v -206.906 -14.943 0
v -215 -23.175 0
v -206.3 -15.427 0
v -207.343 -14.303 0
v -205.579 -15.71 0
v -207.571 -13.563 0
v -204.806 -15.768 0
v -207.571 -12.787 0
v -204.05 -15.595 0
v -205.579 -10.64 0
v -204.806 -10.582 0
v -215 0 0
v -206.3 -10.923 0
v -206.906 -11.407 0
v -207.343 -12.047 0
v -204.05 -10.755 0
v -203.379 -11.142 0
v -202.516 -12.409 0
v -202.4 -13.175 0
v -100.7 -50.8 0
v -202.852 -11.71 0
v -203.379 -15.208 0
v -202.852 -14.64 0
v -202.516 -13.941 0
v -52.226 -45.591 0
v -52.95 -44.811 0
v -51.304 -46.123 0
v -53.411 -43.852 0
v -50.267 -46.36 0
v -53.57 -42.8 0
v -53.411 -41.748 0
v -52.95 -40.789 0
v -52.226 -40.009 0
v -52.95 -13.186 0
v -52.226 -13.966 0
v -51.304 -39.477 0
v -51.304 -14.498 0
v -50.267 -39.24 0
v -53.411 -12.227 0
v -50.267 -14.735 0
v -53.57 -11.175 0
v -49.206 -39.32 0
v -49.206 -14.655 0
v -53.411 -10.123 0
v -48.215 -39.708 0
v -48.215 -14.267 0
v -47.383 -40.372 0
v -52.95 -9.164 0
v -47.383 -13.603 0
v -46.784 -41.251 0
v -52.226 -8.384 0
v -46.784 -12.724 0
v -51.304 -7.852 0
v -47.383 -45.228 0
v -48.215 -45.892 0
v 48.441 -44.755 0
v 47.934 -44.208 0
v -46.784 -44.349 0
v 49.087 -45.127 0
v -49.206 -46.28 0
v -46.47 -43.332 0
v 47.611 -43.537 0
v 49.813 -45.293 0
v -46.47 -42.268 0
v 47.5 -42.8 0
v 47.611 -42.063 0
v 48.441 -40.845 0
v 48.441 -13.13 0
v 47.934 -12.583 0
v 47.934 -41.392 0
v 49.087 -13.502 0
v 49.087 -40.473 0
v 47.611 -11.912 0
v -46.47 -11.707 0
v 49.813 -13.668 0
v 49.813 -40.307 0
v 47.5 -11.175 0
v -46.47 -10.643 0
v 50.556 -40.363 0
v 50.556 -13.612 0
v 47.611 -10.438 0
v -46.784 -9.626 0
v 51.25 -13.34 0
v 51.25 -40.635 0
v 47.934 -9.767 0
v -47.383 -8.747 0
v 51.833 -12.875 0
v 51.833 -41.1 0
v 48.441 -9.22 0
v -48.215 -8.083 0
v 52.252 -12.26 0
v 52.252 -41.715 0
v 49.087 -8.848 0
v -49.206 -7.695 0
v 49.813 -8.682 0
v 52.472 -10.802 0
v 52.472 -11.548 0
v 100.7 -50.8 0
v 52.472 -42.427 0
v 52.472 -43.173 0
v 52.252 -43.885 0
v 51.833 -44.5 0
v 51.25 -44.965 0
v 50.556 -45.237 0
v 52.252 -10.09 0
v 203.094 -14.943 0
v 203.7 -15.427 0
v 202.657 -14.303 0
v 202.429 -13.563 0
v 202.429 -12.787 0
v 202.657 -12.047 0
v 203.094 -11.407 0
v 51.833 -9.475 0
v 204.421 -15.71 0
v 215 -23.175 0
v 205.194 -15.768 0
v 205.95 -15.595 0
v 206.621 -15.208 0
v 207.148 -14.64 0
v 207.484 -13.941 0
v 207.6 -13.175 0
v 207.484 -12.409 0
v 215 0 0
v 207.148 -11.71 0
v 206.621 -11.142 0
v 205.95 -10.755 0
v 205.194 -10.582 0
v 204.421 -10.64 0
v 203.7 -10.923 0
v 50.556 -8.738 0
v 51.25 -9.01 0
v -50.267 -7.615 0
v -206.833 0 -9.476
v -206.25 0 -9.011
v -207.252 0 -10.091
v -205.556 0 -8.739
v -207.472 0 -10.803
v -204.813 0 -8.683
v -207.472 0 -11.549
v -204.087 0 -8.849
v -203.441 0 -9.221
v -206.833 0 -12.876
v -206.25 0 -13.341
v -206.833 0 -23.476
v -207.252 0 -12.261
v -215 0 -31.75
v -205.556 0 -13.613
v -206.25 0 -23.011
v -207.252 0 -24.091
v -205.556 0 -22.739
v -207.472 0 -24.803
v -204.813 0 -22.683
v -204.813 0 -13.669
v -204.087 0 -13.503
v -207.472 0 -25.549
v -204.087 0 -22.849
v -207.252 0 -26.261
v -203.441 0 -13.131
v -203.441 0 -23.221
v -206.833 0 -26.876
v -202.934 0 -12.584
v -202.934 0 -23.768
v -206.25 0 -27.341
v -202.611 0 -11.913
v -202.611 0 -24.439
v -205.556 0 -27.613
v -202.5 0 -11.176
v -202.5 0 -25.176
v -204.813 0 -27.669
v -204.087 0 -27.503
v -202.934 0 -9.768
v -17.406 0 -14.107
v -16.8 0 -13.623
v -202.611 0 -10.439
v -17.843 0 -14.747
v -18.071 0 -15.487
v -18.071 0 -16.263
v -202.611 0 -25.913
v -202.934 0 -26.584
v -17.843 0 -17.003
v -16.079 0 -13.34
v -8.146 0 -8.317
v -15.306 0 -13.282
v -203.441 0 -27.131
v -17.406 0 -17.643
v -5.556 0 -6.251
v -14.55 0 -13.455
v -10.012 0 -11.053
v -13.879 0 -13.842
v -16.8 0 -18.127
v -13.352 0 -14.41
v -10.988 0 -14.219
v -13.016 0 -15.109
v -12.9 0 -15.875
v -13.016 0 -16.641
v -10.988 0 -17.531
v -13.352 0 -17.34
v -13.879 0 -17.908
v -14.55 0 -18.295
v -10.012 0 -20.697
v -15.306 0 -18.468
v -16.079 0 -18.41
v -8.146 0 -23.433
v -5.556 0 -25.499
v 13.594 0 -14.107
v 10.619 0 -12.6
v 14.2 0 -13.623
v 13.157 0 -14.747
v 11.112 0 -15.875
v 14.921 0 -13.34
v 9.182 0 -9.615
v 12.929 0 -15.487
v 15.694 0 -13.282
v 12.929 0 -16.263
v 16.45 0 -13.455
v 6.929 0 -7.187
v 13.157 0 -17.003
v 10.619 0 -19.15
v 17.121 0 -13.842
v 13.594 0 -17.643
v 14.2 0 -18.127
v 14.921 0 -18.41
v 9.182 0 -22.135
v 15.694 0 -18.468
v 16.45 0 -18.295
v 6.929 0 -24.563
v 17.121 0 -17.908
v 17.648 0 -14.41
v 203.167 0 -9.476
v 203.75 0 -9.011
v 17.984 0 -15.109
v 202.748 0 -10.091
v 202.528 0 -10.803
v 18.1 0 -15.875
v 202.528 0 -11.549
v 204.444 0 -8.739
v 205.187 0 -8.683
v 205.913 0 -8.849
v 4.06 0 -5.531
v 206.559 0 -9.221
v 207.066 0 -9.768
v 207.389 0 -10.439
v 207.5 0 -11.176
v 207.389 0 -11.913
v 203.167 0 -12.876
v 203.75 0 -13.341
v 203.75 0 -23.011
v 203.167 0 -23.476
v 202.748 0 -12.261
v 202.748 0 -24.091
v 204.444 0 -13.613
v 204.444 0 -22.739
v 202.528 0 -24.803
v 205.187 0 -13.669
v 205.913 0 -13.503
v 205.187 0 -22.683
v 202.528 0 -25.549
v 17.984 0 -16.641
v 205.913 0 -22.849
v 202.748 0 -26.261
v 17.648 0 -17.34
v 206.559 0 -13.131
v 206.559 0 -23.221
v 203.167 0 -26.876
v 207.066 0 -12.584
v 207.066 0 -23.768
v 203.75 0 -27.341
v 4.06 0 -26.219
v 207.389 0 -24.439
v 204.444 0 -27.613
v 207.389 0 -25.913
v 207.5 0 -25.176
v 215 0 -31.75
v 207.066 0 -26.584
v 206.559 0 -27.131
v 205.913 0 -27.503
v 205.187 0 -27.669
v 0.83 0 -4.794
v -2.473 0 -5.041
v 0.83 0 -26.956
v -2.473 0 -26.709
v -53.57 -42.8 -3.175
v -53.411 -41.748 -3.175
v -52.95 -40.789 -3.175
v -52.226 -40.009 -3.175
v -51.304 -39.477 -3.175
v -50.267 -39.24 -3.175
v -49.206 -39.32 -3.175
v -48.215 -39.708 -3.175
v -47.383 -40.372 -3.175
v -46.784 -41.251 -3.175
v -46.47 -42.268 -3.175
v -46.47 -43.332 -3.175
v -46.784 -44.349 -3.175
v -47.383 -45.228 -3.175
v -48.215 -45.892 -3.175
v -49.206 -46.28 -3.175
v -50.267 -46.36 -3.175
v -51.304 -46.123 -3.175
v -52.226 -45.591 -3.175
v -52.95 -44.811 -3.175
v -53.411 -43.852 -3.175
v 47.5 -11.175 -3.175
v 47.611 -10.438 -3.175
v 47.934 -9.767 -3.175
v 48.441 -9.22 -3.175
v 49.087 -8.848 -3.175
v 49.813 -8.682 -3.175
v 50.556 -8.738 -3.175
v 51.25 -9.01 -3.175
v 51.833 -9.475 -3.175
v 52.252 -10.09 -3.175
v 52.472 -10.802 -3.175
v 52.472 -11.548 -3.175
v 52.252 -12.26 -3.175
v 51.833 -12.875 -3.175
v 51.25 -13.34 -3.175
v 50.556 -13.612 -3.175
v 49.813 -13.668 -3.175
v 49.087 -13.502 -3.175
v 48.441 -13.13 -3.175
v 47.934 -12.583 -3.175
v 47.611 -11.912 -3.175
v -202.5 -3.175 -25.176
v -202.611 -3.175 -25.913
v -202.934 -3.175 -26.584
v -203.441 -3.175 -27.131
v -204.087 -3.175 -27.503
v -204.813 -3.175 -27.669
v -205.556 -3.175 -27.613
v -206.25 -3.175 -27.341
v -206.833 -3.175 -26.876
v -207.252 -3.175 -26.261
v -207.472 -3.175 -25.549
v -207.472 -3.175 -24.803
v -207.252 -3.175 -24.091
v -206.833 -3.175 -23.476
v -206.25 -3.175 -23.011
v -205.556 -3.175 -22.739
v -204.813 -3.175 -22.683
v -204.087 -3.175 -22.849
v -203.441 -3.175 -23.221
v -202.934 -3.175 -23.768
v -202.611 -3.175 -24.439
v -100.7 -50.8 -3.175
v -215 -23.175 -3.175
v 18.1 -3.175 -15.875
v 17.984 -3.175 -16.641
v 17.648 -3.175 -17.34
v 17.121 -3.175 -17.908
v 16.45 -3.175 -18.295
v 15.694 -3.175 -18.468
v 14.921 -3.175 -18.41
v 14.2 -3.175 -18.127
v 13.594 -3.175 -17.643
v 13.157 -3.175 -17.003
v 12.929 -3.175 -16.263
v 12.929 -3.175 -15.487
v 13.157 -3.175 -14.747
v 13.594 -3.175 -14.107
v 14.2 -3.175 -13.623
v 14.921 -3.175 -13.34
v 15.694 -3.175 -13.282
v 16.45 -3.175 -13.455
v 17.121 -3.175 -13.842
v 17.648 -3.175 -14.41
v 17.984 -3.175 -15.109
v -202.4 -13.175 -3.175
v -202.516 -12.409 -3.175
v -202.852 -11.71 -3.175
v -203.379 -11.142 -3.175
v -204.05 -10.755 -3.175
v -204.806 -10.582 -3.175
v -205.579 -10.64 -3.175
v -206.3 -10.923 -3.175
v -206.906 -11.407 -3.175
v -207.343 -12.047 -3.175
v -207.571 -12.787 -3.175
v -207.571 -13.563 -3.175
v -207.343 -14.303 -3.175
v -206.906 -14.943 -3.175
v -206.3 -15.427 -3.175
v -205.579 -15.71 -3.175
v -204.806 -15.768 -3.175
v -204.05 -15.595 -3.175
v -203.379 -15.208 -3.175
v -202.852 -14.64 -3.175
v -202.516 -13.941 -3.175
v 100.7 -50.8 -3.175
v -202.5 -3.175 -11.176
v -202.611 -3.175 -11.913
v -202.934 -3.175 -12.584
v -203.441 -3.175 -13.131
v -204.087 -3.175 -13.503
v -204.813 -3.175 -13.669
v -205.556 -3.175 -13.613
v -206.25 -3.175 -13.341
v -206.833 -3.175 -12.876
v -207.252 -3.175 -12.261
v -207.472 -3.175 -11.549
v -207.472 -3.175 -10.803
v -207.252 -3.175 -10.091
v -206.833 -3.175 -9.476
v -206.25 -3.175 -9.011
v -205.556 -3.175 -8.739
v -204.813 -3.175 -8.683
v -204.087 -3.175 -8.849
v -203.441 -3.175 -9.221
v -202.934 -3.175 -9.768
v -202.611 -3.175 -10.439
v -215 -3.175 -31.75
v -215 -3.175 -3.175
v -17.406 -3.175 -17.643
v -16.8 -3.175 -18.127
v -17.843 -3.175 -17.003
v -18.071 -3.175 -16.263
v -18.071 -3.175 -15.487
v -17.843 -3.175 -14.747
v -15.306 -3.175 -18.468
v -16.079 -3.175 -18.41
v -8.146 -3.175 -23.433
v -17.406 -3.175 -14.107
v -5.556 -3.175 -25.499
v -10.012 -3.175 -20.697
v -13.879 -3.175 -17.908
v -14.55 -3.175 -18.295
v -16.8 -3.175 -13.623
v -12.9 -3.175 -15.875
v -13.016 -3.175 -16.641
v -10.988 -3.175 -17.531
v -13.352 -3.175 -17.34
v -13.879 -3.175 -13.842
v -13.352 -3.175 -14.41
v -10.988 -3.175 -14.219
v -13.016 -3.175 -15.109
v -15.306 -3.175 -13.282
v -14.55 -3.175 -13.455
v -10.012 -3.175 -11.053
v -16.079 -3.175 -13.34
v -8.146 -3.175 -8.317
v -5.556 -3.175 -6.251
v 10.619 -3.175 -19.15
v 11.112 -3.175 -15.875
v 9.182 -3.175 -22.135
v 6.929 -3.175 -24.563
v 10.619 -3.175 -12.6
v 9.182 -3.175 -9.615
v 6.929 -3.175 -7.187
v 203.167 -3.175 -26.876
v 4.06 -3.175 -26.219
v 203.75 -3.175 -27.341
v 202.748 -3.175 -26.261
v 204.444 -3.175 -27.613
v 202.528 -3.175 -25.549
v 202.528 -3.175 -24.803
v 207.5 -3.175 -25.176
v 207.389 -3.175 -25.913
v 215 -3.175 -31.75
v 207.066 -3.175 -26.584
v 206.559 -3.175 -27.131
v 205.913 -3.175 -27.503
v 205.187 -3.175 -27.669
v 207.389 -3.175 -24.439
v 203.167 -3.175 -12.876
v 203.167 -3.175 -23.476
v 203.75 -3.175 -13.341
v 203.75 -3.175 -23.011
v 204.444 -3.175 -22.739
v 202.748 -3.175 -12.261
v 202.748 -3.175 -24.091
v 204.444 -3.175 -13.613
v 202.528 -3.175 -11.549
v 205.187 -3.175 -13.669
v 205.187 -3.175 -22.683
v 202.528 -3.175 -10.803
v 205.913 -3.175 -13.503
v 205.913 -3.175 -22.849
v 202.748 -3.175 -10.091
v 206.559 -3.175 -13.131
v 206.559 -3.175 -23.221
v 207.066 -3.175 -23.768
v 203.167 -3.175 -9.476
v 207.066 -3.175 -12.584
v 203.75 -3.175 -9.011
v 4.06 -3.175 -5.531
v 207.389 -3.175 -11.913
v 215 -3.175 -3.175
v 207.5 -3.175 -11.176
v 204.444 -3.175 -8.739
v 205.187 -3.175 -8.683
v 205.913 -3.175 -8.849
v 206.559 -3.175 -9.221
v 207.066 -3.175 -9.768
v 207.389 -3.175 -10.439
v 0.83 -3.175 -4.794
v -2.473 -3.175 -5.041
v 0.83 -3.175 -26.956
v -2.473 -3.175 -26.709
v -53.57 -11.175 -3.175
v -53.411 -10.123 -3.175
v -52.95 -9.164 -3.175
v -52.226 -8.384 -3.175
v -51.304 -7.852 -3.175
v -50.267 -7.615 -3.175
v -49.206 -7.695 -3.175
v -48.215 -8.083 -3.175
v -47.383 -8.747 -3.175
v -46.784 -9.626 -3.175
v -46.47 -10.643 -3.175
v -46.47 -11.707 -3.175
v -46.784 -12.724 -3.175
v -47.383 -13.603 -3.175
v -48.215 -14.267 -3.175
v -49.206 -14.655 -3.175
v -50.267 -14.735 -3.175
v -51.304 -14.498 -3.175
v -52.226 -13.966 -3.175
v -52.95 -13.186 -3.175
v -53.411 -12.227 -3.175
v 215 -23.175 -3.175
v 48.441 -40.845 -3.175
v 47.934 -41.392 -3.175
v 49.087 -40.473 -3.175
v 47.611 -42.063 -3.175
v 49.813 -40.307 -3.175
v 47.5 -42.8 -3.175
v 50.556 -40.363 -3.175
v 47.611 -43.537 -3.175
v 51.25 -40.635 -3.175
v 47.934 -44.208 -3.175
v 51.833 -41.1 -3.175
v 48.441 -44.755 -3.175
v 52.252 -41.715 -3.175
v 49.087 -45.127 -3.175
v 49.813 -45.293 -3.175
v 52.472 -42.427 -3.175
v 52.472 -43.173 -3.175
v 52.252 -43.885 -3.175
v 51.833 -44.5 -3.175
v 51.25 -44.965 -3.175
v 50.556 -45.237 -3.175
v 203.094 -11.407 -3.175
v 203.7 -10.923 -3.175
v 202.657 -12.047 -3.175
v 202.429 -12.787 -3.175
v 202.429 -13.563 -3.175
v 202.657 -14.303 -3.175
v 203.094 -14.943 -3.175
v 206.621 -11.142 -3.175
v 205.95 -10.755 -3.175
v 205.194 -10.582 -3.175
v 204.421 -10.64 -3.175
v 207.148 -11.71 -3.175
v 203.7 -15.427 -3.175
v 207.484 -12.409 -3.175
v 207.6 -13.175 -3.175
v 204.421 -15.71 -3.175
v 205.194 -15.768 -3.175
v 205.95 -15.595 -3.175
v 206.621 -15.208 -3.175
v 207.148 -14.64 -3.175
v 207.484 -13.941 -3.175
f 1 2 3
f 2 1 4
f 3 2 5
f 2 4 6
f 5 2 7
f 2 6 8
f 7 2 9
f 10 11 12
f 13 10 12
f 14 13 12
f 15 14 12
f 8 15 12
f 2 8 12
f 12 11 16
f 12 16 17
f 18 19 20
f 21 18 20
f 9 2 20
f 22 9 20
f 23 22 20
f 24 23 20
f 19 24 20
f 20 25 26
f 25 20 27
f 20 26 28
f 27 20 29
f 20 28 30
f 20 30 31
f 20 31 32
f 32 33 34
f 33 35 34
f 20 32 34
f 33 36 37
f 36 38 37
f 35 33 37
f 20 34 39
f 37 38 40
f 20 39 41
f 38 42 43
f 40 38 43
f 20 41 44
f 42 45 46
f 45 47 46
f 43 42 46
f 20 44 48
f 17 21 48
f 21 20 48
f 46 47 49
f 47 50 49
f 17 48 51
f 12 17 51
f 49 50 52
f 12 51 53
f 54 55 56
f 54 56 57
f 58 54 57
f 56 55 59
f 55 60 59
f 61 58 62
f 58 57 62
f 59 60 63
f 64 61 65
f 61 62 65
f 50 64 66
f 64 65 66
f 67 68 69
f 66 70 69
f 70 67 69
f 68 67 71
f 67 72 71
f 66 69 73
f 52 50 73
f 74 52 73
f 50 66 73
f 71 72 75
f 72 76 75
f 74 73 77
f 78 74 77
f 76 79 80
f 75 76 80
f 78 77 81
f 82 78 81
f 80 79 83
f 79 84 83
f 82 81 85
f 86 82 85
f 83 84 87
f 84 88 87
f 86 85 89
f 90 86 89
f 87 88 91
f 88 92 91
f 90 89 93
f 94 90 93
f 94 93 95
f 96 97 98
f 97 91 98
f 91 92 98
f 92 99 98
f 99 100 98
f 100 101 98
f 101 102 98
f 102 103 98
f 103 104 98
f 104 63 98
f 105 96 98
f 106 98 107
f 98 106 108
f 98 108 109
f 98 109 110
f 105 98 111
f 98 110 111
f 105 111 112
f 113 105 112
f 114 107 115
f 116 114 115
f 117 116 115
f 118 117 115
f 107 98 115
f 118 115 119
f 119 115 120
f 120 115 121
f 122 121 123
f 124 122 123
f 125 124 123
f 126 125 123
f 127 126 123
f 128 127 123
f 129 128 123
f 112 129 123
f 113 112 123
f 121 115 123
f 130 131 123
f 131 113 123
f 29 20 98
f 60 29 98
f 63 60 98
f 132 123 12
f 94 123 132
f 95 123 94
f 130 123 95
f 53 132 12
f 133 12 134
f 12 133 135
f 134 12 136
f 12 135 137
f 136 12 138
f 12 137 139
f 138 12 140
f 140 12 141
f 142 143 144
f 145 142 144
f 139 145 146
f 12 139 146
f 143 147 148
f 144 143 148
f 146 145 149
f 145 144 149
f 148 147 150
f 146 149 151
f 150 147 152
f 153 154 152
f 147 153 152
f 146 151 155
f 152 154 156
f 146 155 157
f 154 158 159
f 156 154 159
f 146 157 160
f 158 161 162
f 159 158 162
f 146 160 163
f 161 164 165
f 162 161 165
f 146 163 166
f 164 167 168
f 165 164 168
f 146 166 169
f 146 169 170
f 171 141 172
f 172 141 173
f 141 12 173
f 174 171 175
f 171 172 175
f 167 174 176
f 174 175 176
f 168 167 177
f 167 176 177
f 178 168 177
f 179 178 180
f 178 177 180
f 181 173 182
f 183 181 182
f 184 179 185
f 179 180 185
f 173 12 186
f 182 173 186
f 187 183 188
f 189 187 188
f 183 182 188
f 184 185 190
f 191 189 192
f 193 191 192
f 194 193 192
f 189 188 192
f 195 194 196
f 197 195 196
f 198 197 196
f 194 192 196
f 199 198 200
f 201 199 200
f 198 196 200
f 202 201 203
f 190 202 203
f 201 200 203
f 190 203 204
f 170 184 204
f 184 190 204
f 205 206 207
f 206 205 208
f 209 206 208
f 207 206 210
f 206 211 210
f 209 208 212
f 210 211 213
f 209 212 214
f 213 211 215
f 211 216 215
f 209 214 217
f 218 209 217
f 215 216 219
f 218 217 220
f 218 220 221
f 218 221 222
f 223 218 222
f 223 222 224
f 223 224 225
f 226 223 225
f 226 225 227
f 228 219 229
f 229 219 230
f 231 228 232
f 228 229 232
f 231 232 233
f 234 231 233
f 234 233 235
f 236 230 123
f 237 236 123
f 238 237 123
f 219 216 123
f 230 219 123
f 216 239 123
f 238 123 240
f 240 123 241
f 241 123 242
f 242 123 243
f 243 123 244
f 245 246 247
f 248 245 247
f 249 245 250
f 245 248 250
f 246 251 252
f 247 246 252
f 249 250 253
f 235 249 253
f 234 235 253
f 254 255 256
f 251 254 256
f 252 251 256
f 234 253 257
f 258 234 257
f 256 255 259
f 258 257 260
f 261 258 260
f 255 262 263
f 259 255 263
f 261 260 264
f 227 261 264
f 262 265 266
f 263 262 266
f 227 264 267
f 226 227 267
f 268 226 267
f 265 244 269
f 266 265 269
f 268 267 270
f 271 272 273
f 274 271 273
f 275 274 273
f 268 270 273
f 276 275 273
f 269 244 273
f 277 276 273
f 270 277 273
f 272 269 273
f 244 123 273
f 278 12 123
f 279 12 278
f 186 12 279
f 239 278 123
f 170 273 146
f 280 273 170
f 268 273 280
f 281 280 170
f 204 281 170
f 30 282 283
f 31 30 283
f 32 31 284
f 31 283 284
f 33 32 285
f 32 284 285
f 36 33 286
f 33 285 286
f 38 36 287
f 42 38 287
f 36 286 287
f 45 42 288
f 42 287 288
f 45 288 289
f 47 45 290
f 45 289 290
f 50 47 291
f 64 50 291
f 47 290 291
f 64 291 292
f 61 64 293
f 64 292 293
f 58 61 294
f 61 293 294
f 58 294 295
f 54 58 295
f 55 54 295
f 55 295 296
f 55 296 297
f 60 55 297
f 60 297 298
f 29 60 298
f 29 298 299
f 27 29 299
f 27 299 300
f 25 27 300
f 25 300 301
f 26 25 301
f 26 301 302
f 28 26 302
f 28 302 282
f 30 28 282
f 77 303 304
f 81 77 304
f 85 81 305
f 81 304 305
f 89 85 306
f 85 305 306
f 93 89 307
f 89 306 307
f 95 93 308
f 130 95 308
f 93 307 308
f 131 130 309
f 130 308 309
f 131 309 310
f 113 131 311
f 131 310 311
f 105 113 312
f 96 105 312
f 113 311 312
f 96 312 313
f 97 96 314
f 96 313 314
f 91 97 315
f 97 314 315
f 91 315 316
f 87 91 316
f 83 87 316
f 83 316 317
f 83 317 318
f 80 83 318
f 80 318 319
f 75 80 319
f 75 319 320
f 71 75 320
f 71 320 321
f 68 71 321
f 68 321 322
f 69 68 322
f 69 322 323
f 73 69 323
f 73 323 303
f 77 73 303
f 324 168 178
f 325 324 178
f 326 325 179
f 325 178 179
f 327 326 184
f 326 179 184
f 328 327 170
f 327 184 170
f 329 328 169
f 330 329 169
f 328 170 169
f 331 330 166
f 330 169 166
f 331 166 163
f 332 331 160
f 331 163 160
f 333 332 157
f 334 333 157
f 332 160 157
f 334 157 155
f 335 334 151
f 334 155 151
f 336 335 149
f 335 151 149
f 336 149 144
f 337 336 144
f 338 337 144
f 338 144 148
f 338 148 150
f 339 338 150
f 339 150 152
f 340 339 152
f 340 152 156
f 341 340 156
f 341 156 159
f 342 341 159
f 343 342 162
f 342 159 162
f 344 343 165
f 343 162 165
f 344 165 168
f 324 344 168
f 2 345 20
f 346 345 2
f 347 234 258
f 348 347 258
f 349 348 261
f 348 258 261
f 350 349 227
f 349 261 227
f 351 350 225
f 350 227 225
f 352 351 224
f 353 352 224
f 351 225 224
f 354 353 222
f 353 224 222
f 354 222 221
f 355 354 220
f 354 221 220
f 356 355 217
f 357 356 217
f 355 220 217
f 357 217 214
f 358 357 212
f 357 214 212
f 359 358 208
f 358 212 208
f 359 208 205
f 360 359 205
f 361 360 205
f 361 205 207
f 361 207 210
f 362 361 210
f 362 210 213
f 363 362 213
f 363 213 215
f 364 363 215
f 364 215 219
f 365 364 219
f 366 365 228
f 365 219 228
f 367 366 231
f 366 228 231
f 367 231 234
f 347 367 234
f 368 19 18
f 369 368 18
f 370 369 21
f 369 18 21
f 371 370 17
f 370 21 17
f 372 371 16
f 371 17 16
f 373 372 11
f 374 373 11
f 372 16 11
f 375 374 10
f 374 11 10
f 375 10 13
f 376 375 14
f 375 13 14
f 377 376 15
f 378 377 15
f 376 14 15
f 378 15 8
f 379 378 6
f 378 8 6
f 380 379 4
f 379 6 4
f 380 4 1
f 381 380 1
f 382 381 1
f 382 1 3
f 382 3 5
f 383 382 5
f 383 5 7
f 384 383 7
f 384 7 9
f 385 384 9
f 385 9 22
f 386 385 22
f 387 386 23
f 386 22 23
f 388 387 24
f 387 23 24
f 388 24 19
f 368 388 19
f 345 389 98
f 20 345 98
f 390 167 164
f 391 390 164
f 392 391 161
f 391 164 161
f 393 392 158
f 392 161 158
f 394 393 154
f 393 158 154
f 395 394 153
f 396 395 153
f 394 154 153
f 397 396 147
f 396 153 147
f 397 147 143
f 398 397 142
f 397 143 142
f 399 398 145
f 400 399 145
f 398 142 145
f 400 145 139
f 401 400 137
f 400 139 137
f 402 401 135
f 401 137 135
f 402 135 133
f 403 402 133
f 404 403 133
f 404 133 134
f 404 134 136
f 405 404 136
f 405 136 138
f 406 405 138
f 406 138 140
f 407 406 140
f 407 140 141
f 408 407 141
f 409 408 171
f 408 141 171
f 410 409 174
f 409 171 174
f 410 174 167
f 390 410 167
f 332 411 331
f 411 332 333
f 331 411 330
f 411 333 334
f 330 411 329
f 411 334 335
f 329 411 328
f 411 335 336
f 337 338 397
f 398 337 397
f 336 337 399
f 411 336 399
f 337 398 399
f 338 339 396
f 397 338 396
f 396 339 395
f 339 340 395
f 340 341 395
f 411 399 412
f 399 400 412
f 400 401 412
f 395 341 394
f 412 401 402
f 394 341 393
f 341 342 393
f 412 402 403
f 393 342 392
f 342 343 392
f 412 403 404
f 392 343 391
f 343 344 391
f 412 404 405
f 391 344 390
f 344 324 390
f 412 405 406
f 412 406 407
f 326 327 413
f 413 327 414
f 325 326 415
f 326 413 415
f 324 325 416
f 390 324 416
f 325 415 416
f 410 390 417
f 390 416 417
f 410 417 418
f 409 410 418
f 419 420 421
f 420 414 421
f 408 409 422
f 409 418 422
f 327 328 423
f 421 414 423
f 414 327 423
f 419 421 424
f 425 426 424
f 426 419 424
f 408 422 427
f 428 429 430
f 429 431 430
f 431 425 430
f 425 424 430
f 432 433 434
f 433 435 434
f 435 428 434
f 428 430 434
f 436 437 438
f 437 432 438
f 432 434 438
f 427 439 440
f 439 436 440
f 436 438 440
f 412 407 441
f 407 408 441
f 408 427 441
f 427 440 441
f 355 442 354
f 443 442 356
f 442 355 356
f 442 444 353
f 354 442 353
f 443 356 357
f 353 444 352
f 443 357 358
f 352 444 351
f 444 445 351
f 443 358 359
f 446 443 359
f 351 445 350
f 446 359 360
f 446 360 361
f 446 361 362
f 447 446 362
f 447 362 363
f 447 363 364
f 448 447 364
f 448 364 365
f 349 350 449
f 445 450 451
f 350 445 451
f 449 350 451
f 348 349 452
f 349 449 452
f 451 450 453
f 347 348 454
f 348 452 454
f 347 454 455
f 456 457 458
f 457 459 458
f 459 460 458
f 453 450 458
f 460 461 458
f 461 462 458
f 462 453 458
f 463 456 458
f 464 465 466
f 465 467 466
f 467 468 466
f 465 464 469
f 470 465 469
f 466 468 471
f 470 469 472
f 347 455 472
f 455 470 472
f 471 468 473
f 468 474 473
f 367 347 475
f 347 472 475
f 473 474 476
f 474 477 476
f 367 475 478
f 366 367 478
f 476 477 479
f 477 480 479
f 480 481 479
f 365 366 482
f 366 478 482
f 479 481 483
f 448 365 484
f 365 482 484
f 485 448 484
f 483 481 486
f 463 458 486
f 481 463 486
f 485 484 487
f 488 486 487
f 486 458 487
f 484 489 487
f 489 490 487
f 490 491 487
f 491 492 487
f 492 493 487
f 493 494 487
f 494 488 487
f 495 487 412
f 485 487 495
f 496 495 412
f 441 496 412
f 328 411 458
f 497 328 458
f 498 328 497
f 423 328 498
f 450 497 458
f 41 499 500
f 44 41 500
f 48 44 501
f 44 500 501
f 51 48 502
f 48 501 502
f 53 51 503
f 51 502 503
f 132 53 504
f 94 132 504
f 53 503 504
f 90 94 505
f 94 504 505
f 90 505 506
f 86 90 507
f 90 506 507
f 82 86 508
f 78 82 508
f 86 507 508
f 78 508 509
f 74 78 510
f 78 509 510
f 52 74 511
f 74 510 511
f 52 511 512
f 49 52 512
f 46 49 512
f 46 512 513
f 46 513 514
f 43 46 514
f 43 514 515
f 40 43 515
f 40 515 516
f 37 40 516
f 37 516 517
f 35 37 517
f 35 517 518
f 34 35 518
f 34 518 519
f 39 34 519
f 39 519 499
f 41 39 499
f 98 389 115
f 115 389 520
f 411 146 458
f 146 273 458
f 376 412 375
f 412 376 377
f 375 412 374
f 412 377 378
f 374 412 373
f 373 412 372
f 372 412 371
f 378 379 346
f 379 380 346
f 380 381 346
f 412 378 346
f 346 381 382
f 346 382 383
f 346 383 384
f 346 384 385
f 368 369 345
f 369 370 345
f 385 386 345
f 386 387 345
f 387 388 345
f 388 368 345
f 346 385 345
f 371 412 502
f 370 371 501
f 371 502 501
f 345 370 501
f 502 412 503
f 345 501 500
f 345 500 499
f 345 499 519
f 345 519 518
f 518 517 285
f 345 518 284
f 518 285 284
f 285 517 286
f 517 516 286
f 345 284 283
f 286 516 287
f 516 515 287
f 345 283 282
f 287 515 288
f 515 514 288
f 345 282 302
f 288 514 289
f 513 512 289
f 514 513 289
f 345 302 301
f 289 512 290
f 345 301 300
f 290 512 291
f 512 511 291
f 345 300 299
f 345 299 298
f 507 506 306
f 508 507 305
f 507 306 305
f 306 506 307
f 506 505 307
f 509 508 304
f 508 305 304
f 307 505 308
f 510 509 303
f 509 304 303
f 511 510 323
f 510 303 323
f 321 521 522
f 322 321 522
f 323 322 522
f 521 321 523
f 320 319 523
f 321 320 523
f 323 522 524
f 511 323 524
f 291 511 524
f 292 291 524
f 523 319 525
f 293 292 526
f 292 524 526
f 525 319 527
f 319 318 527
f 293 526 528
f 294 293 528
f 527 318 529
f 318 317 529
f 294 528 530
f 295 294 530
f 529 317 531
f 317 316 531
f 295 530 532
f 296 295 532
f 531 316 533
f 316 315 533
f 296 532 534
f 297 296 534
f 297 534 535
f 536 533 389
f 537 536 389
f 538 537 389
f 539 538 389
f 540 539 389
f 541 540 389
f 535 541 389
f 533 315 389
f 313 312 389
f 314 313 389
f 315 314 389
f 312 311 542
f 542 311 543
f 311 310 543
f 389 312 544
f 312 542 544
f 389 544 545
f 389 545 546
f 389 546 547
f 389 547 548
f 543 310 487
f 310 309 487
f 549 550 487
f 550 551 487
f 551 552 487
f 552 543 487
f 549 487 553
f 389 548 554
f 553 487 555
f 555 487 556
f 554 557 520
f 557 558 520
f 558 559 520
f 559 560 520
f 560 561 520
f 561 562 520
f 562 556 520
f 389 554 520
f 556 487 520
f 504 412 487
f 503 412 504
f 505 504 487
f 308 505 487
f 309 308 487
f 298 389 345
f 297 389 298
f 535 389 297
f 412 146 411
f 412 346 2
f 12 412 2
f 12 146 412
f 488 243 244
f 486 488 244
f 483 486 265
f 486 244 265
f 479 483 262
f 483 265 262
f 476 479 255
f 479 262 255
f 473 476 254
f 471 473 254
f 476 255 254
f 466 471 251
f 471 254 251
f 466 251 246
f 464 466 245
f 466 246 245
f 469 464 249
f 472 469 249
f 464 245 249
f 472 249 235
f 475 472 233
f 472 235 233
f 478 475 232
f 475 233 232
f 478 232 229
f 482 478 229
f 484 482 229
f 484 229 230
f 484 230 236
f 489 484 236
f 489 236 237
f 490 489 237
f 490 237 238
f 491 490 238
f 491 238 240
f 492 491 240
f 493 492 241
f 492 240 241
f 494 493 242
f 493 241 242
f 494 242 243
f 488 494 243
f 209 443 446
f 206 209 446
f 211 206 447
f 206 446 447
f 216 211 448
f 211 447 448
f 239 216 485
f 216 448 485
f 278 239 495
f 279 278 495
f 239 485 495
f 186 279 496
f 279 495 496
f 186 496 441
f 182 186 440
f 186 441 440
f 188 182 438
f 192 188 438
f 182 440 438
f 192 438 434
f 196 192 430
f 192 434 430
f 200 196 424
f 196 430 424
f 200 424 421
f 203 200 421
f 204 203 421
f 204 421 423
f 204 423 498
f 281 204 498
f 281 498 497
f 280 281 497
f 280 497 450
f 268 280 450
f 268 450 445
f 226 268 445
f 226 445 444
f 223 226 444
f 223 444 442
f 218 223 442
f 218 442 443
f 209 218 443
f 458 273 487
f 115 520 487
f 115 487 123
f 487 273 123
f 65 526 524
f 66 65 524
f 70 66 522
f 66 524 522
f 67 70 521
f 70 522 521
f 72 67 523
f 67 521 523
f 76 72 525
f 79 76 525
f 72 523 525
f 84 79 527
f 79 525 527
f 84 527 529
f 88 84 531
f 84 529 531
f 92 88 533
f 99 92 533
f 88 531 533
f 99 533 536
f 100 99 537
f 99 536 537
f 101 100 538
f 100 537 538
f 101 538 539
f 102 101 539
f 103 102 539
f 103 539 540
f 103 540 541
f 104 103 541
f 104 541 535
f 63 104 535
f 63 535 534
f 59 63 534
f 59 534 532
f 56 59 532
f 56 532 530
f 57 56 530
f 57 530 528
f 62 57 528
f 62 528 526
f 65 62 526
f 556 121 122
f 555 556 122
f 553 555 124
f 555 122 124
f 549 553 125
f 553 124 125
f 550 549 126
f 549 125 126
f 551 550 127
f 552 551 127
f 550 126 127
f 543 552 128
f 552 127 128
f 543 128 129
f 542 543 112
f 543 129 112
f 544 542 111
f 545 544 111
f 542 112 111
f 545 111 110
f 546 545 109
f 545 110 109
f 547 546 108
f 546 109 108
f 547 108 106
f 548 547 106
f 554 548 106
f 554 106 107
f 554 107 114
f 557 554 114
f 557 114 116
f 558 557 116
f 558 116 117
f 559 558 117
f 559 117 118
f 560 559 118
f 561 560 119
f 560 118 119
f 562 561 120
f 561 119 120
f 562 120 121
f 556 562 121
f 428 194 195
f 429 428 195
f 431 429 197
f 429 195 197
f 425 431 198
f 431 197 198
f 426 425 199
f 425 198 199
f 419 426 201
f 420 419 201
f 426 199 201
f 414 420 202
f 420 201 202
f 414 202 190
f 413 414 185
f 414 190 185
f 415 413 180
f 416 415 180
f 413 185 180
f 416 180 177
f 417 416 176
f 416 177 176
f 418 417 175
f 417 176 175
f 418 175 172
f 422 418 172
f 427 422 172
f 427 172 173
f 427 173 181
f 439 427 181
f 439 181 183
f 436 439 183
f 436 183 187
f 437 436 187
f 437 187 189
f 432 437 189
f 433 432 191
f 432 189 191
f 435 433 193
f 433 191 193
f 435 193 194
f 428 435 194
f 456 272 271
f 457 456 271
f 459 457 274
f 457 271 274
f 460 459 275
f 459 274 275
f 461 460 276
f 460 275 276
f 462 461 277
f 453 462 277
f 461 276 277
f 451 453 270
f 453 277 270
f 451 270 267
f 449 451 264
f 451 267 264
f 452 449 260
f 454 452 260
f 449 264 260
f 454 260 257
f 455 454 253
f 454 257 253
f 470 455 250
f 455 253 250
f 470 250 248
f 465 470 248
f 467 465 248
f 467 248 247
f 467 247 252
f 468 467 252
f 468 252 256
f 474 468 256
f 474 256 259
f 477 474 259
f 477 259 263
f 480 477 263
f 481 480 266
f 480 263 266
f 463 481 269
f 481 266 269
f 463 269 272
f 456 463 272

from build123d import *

# Parameters (mm, degrees)
BOSS_EXTRUDE1_DEPTH = 215
SKETCH2_R           = 2.5
SKETCH2_R_2         = 3.57
CUT_EXTRUDE1_DEPTH  = 4.175
CUT_EXTRUDE2_DEPTH  = 3.175
SKETCH4_R           = 2.5
CUT_EXTRUDE3_DEPTH  = 3.175
CUT_EXTRUDE4_REACH  = 5.175
SKETCH5_R           = 11.1125
SKETCH6_R           = 2.6
CUT_EXTRUDE5_DEPTH  = 3.175
SKETCH7_R           = 2.6
CUT_EXTRUDE6_DEPTH  = 3.175


with BuildPart() as part:
    # Sketch1 → Boss-Extrude1 (new body, symmetric)
    with BuildSketch(Plane(origin=(0, 0, 0), x_dir=(0, 0, -1), z_dir=(1, 0, 0))):
        Polygon((0, 0), (31.75, 0), (31.75, -3.175), (3.175, -3.175), (3.175, -50.8), (0, -50.8), align=None)
    extrude(amount=BOSS_EXTRUDE1_DEPTH, both=True)

    # Sketch2 → Cut-Extrude1 (cut, through all)
    with BuildSketch(Plane(origin=(0, 0, -3.175), x_dir=(-1, 0, 0), z_dir=(0, 0, -1))):
        with Locations((-50, -11.175)):
            Circle(SKETCH2_R)
        with Locations((50, -11.175)):
            Circle(SKETCH2_R_2)
        with Locations((50, -42.8)):
            Circle(SKETCH2_R_2)
        with Locations((-50, -42.8)):
            Circle(SKETCH2_R)
    extrude(amount=-CUT_EXTRUDE1_DEPTH, mode=Mode.SUBTRACT)

    # Sketch3 → Cut-Extrude2 (cut)
    with BuildSketch(Plane(origin=(0, 0, -3.175), x_dir=(-1, 0, 0), z_dir=(0, 0, -1))):
        Polygon((215, -50.8), (100.7, -50.8), (215, -23.175), align=None)
        Polygon((-215, -23.175), (-215, -50.8), (-100.7, -50.8), align=None)
    extrude(amount=-CUT_EXTRUDE2_DEPTH, mode=Mode.SUBTRACT)

    # Sketch4 → Cut-Extrude3 (cut)
    with BuildSketch(Plane(origin=(0, 0, 0), x_dir=(1, 0, 0), z_dir=(0, 1, 0))):
        with Locations((-205, 11.176)):
            Circle(SKETCH4_R)
        with Locations((-205, 25.176)):
            Circle(SKETCH4_R)
        with Locations((205, 25.176)):
            Circle(SKETCH4_R)
        with Locations((205, 11.176)):
            Circle(SKETCH4_R)
    extrude(amount=-CUT_EXTRUDE3_DEPTH, mode=Mode.SUBTRACT)

    # Sketch5 → Cut-Extrude4 (cut, up to next)
    with BuildSketch(Plane.XZ.offset(3.175), mode=Mode.PRIVATE) as cut_extrude4_sk1:
        with Locations((0, -15.875)):
            Circle(SKETCH5_R)
    cut_extrude4_tool1 = extrude(cut_extrude4_sk1.sketch, amount=-CUT_EXTRUDE4_REACH, mode=Mode.PRIVATE) & part.part
    add(cut_extrude4_tool1.solids().sort_by_distance((0, -3.175, -15.875))[0], mode=Mode.SUBTRACT)

    # Sketch6 → Cut-Extrude5 (cut)
    with BuildSketch(Plane.XY):
        with Locations((205, -13.175000066)):
            Circle(SKETCH6_R)
        with Locations((-205, -13.175000066)):
            Circle(SKETCH6_R)
    extrude(amount=-CUT_EXTRUDE5_DEPTH, mode=Mode.SUBTRACT)

    # Sketch7 → Cut-Extrude6 (cut)
    with BuildSketch(Plane(origin=(0, 0, 0), x_dir=(1, 0, 0), z_dir=(0, 1, 0))):
        with Locations((15.5, 15.875)):
            Circle(SKETCH7_R)
        with Locations((-15.5, 15.875)):
            Circle(SKETCH7_R)
    extrude(amount=-CUT_EXTRUDE6_DEPTH, mode=Mode.SUBTRACT)


solid = part.part
